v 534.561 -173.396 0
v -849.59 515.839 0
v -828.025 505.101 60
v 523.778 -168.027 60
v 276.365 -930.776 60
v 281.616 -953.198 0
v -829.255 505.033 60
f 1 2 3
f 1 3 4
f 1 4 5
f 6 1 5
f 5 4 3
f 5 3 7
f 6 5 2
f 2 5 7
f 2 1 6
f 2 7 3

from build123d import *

# Parameters (mm, degrees)
EXTRUDE_1_DEPTH    = 60
CHAMFER3_SIZE2     = 11.912970931
CHAMFER3_SIZE      = 60
CHAMFER4_SIZE2     = 11.912970931
CHAMFER4_SIZE      = 60
CHAMFER5_SIZE2     = 9.519169095
CHAMFER5_SIZE      = 60
CUT_EXTRUDE2_DEPTH = 2201.39802191


with BuildPart() as part:
    # Эскиз1 → Бобышка-Вытянуть1 (new body)
    with BuildSketch(Plane.XY):
        Polygon((-849.589927609, 515.838957491), (787.506047005, 606.405063543), (281.615569427, -953.197537878), align=None)
    extrude(amount=EXTRUDE_1_DEPTH)

    # Chamfer3
    chamfer3_edges = [part.edges().sort_by_distance(p)[0] for p in [
        (-31.041940302, 561.122010517, 60),
    ]]
    chamfer3_side = [part.faces().sort_by_distance(p)[0] for p in [
        (-31.041940302, 561.122010517, 59.761740581),
    ]]
    chamfer(chamfer3_edges, length=CHAMFER3_SIZE - 0.0001, length2=CHAMFER3_SIZE2 - 0.0001, reference=chamfer3_side[0])  # a hair under: the kernel refuses the full size

    # Chamfer4
    chamfer4_edges = [part.edges().sort_by_distance(p)[0] for p in [
        (532.590398399, -179.470785737, 60),
    ]]
    chamfer4_side = [part.faces().sort_by_distance(p)[0] for p in [
        (532.590398399, -179.470785737, 59.761740581),
    ]]
    chamfer(chamfer4_edges, length=CHAMFER4_SIZE - 0.0001, length2=CHAMFER4_SIZE2 - 0.0001, reference=chamfer4_side[0])  # a hair under: the kernel refuses the full size

    # Chamfer5
    chamfer5_edges = [part.edges().sort_by_distance(p)[0] for p in [
        (-283.987179091, -218.679290193, 60),
    ]]
    chamfer5_side = [part.faces().sort_by_distance(p)[0] for p in [
        (-283.987179091, -218.679290193, 59.809616618),
    ]]
    chamfer(chamfer5_edges, length=CHAMFER5_SIZE - 0.0001, length2=CHAMFER5_SIZE2 - 0.0001, reference=chamfer5_side[0])  # a hair under: the kernel refuses the full size

    # 3DSketch1 → Cut-Extrude2 (cut, through all)
    with BuildSketch(Plane(origin=(-849.589927609, 515.838957491, 0), x_dir=(0.9984732860919079, 0.05523673560980175, 0), z_dir=(0, 0, -1))):
        Polygon((0, 0), (1343.966431425, 764.63889794), (1639.599173476, 0), align=None)
    extrude(amount=-CUT_EXTRUDE2_DEPTH, mode=Mode.SUBTRACT)


solid = part.part
